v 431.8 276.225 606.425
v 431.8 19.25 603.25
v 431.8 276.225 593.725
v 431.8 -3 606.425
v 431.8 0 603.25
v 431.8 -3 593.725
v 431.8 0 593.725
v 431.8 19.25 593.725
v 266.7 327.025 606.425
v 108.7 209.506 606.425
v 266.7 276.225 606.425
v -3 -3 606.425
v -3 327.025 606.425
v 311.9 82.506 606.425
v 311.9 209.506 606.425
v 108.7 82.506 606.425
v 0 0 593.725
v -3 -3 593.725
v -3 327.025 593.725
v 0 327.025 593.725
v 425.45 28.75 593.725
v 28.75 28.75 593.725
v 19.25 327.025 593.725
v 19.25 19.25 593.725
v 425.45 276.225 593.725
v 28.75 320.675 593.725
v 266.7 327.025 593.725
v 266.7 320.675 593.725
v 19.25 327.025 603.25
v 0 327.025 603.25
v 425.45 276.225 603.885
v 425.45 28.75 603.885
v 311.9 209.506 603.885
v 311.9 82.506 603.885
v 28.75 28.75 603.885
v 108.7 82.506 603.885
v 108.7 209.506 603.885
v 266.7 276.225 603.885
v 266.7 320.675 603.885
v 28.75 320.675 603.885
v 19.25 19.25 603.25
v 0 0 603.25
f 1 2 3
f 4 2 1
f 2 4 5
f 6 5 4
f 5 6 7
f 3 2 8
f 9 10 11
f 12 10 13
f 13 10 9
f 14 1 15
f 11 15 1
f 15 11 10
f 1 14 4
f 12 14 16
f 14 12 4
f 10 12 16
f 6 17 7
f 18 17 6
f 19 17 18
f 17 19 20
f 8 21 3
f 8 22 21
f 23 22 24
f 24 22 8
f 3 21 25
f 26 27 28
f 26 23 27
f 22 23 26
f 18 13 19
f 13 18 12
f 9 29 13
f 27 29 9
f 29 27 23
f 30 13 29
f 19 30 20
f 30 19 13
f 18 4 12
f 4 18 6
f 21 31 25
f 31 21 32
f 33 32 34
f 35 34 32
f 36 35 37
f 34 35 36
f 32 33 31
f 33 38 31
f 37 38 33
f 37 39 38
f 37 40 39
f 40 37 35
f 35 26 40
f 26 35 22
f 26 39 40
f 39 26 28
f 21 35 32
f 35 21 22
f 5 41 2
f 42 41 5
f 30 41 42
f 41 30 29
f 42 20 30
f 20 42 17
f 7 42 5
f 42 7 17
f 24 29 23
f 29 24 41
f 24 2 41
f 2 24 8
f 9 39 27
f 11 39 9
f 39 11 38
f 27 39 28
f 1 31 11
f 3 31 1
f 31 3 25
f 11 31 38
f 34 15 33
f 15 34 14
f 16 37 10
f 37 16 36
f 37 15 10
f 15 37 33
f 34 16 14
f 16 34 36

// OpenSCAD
tank_depth=25.75*25.4;
tank_width=71*25.4;
tank_height=23.75*25.4;
tank_wall_thickness=(0.75*25.4) +.2;
tank_bottom_thickness=0.75*25.4;

section_x=(17*25.4) + 3;
section_y=(12.875*25.4) + 3;
section_z=.50*25.4;

section_cutout_x=8*25.4;
section_cutout_y=5*25.4;
section_cutout_z=section_z+.2;


light_x=50*25.4;
light_y=4*25.4;
light_z=10*25.4;

overflow_x=10.5*25.4;
overflow_y=4*25.4;
overflow_z=tank_height;

// 0 - all
// 1 = left front (red)
// 2= left back (purple)

part=1;

if(part == 0){
    %union(){
        translate([tank_width/2 - light_x/2, tank_depth/2 - light_y/2,tank_height-.1])
        cube([light_x, light_y, light_z]);
        translate([tank_width/2 - overflow_x/2, tank_depth - overflow_y,.1])
        cube([overflow_x, overflow_y, overflow_z]);
        difference(){
            cube([tank_width,tank_depth, tank_height]);
            translate([tank_wall_thickness,tank_wall_thickness,tank_bottom_thickness])
            cube([tank_width-(2*tank_wall_thickness),tank_depth-(2*tank_wall_thickness), tank_height]);
        }
    }
}


if(part == 0 || part == 1){
    color("red"){
        difference(){
            translate([-3,-3,tank_height-(section_z*.75)]){
                difference(){
                    cube([section_x, section_y, section_z]);
                    color("blue")
                    translate([(1.25*25.4),(1.25*25.4),-.1]){
                        cube([section_x- (1.50*25.4), section_y- (1.50*25.4), .1 + section_z*.80]);
                    }
                }
            }

            translate([tank_width/2 - light_x/2, tank_depth/2 - light_y/2,tank_height-25])
            color("green")
            cube([light_x, light_y, light_z]);
            translate([tank_width/2 - overflow_x/2, tank_depth - overflow_y,.1])
            cube([overflow_x, overflow_y, overflow_z]);
            difference(){
                cube([tank_width,tank_depth, tank_height]);
                translate([tank_wall_thickness,tank_wall_thickness,tank_bottom_thickness])
                cube([tank_width-(2*tank_wall_thickness),tank_depth-(2*tank_wall_thickness), tank_height]);
            }
            
            translate([section_x/4, section_y/4,tank_height-.1])
            cube([section_cutout_x,section_cutout_y, section_cutout_z]);
            
        }
    }
}

if(part == 0 || part == 2){
    color("purple"){
        difference(){
            translate([-3,section_y-3,tank_height-(section_z*.75)]){
                difference(){
                    cube([section_x, section_y, section_z]);
                    color("blue")
                    translate([(1.25*25.4),+(.25*25.4),-.1]){
                        cube([section_x- (1.50*25.4), section_y- (1.50*25.4), .1 + section_z*.80]);
                    }
                }
            }

            translate([tank_width/2 - light_x/2, tank_depth/2 - light_y/2,tank_height-25])
            color("green")
            cube([light_x, light_y, light_z]);
            translate([tank_width/2 - overflow_x/2, tank_depth - overflow_y,.1])
            cube([overflow_x, overflow_y, overflow_z]);
            difference(){
                cube([tank_width,tank_depth, tank_height]);
                translate([tank_wall_thickness,tank_wall_thickness,tank_bottom_thickness])
                cube([tank_width-(2*tank_wall_thickness),tank_depth-(2*tank_wall_thickness), tank_height]);
            }
            
            translate([section_x/4, tank_depth - section_y/4 - section_cutout_y,tank_height-.1])
            cube([section_cutout_x,section_cutout_y, section_cutout_z]);
        }
    }
}
